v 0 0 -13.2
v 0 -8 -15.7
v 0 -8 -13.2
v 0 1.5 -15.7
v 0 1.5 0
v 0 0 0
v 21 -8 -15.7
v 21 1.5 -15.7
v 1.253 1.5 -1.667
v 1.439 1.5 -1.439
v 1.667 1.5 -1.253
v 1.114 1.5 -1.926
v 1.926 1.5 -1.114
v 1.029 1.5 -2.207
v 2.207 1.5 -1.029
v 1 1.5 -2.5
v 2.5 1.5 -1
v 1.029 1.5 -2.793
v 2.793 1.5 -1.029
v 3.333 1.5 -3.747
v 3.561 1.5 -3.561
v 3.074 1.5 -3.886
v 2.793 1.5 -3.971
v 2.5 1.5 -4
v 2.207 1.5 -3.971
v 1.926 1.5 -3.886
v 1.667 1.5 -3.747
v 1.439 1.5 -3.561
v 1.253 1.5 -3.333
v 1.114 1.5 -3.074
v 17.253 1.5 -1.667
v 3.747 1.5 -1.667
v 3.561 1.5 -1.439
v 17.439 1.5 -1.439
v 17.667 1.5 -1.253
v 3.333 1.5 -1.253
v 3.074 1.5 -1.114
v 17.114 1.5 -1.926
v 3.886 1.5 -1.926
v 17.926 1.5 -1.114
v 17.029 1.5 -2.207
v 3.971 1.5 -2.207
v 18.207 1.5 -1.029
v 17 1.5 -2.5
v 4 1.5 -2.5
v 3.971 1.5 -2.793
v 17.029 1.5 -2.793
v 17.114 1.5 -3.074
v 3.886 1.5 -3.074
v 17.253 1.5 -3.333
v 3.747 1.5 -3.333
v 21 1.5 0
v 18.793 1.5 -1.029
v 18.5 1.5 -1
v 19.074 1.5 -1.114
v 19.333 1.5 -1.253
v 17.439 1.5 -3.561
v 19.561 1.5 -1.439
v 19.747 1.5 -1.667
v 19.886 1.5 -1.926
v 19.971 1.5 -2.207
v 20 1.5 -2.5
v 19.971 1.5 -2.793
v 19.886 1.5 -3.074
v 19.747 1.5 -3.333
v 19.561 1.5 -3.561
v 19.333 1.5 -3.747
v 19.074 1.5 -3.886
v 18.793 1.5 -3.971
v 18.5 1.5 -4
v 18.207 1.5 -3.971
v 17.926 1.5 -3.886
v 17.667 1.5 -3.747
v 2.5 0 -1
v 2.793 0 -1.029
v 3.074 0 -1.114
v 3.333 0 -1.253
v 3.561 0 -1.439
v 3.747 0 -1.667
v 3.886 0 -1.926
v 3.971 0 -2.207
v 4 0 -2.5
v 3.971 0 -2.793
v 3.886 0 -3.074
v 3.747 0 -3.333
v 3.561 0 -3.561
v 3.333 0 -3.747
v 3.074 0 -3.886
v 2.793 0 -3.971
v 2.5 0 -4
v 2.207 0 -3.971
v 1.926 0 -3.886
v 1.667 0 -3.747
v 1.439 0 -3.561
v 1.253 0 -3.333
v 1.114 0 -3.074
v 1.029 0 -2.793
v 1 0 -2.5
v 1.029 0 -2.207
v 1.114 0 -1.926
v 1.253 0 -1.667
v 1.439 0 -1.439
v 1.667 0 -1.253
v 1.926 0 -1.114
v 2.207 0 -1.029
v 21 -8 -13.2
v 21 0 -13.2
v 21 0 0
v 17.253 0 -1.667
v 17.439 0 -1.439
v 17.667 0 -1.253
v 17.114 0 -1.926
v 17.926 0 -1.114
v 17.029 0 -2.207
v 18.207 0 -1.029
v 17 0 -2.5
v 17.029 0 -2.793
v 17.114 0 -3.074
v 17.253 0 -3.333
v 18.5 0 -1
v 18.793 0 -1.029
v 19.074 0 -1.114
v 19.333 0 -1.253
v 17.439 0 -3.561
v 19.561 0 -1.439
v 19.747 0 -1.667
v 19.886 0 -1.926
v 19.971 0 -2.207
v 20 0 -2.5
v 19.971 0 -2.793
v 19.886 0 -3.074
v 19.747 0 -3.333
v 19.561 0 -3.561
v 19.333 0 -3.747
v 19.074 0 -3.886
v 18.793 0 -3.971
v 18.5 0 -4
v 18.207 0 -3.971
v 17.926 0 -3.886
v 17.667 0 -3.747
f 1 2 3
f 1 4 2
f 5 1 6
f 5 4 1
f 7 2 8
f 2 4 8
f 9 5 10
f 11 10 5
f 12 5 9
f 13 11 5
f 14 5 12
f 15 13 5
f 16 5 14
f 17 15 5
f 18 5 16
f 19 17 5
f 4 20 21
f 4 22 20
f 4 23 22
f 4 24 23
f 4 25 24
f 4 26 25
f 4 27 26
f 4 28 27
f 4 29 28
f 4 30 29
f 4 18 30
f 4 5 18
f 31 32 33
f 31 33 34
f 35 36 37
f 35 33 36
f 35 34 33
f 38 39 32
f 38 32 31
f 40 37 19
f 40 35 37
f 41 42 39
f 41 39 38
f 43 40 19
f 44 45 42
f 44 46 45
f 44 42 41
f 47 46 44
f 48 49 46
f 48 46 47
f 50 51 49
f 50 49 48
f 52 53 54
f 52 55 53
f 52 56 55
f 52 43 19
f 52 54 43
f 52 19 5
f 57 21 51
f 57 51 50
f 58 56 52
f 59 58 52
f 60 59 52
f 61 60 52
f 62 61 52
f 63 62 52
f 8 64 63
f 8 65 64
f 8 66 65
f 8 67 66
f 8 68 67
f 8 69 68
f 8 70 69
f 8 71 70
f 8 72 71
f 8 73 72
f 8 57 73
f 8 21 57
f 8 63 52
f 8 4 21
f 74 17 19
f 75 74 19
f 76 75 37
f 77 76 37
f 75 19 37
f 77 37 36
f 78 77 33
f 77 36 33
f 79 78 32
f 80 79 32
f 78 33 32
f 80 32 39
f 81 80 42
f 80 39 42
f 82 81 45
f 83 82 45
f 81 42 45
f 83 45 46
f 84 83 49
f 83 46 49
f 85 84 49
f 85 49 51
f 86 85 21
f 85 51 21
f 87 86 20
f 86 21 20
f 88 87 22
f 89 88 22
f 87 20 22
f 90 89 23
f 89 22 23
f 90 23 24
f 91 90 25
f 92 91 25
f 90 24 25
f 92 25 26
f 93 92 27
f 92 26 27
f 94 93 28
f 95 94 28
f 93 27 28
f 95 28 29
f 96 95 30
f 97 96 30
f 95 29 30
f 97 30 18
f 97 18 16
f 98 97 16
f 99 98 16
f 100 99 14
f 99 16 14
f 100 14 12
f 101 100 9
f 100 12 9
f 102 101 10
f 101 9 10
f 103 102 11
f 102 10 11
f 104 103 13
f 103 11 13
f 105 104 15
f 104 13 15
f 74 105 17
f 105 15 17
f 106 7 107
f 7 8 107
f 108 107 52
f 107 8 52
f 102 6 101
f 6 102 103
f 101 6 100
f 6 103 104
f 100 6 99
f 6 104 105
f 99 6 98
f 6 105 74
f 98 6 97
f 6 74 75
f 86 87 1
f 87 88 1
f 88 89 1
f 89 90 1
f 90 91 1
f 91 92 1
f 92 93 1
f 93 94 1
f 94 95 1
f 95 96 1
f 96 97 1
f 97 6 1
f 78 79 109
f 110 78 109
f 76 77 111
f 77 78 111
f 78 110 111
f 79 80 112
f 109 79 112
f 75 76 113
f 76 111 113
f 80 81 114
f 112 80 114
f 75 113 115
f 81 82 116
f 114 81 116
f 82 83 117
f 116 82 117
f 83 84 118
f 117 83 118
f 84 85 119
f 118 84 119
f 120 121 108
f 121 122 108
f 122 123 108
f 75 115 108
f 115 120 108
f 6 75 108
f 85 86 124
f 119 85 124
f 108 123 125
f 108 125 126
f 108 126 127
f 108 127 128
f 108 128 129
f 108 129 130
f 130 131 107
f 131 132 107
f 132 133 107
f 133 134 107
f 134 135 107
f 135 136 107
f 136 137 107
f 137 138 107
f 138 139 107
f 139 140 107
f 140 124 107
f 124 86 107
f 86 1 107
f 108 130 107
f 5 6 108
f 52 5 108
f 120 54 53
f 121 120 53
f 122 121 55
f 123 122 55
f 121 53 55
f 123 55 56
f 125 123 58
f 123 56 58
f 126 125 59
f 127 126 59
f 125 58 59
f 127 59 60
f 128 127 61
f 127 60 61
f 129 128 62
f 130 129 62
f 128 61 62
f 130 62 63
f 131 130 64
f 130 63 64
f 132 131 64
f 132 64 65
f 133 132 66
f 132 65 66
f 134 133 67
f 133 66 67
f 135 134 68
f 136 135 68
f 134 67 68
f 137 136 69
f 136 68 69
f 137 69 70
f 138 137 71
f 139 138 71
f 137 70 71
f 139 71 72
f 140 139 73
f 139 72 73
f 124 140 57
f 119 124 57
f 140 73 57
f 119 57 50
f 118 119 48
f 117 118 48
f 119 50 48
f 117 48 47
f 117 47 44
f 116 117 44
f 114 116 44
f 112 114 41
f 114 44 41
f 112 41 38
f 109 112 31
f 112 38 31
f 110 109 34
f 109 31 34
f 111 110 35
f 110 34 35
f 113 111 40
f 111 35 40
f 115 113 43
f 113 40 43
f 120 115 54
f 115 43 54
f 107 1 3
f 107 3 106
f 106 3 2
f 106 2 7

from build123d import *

# Parameters (mm, degrees)
SKETCH1_W           = 21
SKETCH1_H           = 15.7
BOSS_EXTRUDE1_DEPTH = 1.5
SKETCH2_R           = 1.5
CUT_EXTRUDE1_DEPTH  = 1.5
SKETCH3_W           = 21
SKETCH3_H           = 2.5
BOSS_EXTRUDE2_DEPTH = 8


with BuildPart() as part:
    # Sketch1 → Boss-Extrude1 (new body)
    with BuildSketch(Plane(origin=(0, 0, 0), x_dir=(1, 0, 0), z_dir=(0, 1, 0))):
        with Locations((10.5, 7.85)):
            Rectangle(SKETCH1_W, SKETCH1_H)
    extrude(amount=BOSS_EXTRUDE1_DEPTH)

    # Sketch2 → Cut-Extrude1 (cut)
    with BuildSketch(Plane(origin=(0, 1.5, 0), x_dir=(1, 0, 0), z_dir=(0, 1, 0))):
        with Locations(Location((2.5, 2.5, 0), (0, 0, 270))):
            Circle(SKETCH2_R)
        with Locations(Location((18.5, 2.5, 0), (0, 0, 270))):
            Circle(SKETCH2_R)
    extrude(amount=-CUT_EXTRUDE1_DEPTH, mode=Mode.SUBTRACT)

    # Sketch3 → Boss-Extrude2 (add)
    with BuildSketch(Plane.XZ):
        with Locations((10.5, -14.45)):
            Rectangle(SKETCH3_W, SKETCH3_H)
    extrude(amount=BOSS_EXTRUDE2_DEPTH)


solid = part.part
